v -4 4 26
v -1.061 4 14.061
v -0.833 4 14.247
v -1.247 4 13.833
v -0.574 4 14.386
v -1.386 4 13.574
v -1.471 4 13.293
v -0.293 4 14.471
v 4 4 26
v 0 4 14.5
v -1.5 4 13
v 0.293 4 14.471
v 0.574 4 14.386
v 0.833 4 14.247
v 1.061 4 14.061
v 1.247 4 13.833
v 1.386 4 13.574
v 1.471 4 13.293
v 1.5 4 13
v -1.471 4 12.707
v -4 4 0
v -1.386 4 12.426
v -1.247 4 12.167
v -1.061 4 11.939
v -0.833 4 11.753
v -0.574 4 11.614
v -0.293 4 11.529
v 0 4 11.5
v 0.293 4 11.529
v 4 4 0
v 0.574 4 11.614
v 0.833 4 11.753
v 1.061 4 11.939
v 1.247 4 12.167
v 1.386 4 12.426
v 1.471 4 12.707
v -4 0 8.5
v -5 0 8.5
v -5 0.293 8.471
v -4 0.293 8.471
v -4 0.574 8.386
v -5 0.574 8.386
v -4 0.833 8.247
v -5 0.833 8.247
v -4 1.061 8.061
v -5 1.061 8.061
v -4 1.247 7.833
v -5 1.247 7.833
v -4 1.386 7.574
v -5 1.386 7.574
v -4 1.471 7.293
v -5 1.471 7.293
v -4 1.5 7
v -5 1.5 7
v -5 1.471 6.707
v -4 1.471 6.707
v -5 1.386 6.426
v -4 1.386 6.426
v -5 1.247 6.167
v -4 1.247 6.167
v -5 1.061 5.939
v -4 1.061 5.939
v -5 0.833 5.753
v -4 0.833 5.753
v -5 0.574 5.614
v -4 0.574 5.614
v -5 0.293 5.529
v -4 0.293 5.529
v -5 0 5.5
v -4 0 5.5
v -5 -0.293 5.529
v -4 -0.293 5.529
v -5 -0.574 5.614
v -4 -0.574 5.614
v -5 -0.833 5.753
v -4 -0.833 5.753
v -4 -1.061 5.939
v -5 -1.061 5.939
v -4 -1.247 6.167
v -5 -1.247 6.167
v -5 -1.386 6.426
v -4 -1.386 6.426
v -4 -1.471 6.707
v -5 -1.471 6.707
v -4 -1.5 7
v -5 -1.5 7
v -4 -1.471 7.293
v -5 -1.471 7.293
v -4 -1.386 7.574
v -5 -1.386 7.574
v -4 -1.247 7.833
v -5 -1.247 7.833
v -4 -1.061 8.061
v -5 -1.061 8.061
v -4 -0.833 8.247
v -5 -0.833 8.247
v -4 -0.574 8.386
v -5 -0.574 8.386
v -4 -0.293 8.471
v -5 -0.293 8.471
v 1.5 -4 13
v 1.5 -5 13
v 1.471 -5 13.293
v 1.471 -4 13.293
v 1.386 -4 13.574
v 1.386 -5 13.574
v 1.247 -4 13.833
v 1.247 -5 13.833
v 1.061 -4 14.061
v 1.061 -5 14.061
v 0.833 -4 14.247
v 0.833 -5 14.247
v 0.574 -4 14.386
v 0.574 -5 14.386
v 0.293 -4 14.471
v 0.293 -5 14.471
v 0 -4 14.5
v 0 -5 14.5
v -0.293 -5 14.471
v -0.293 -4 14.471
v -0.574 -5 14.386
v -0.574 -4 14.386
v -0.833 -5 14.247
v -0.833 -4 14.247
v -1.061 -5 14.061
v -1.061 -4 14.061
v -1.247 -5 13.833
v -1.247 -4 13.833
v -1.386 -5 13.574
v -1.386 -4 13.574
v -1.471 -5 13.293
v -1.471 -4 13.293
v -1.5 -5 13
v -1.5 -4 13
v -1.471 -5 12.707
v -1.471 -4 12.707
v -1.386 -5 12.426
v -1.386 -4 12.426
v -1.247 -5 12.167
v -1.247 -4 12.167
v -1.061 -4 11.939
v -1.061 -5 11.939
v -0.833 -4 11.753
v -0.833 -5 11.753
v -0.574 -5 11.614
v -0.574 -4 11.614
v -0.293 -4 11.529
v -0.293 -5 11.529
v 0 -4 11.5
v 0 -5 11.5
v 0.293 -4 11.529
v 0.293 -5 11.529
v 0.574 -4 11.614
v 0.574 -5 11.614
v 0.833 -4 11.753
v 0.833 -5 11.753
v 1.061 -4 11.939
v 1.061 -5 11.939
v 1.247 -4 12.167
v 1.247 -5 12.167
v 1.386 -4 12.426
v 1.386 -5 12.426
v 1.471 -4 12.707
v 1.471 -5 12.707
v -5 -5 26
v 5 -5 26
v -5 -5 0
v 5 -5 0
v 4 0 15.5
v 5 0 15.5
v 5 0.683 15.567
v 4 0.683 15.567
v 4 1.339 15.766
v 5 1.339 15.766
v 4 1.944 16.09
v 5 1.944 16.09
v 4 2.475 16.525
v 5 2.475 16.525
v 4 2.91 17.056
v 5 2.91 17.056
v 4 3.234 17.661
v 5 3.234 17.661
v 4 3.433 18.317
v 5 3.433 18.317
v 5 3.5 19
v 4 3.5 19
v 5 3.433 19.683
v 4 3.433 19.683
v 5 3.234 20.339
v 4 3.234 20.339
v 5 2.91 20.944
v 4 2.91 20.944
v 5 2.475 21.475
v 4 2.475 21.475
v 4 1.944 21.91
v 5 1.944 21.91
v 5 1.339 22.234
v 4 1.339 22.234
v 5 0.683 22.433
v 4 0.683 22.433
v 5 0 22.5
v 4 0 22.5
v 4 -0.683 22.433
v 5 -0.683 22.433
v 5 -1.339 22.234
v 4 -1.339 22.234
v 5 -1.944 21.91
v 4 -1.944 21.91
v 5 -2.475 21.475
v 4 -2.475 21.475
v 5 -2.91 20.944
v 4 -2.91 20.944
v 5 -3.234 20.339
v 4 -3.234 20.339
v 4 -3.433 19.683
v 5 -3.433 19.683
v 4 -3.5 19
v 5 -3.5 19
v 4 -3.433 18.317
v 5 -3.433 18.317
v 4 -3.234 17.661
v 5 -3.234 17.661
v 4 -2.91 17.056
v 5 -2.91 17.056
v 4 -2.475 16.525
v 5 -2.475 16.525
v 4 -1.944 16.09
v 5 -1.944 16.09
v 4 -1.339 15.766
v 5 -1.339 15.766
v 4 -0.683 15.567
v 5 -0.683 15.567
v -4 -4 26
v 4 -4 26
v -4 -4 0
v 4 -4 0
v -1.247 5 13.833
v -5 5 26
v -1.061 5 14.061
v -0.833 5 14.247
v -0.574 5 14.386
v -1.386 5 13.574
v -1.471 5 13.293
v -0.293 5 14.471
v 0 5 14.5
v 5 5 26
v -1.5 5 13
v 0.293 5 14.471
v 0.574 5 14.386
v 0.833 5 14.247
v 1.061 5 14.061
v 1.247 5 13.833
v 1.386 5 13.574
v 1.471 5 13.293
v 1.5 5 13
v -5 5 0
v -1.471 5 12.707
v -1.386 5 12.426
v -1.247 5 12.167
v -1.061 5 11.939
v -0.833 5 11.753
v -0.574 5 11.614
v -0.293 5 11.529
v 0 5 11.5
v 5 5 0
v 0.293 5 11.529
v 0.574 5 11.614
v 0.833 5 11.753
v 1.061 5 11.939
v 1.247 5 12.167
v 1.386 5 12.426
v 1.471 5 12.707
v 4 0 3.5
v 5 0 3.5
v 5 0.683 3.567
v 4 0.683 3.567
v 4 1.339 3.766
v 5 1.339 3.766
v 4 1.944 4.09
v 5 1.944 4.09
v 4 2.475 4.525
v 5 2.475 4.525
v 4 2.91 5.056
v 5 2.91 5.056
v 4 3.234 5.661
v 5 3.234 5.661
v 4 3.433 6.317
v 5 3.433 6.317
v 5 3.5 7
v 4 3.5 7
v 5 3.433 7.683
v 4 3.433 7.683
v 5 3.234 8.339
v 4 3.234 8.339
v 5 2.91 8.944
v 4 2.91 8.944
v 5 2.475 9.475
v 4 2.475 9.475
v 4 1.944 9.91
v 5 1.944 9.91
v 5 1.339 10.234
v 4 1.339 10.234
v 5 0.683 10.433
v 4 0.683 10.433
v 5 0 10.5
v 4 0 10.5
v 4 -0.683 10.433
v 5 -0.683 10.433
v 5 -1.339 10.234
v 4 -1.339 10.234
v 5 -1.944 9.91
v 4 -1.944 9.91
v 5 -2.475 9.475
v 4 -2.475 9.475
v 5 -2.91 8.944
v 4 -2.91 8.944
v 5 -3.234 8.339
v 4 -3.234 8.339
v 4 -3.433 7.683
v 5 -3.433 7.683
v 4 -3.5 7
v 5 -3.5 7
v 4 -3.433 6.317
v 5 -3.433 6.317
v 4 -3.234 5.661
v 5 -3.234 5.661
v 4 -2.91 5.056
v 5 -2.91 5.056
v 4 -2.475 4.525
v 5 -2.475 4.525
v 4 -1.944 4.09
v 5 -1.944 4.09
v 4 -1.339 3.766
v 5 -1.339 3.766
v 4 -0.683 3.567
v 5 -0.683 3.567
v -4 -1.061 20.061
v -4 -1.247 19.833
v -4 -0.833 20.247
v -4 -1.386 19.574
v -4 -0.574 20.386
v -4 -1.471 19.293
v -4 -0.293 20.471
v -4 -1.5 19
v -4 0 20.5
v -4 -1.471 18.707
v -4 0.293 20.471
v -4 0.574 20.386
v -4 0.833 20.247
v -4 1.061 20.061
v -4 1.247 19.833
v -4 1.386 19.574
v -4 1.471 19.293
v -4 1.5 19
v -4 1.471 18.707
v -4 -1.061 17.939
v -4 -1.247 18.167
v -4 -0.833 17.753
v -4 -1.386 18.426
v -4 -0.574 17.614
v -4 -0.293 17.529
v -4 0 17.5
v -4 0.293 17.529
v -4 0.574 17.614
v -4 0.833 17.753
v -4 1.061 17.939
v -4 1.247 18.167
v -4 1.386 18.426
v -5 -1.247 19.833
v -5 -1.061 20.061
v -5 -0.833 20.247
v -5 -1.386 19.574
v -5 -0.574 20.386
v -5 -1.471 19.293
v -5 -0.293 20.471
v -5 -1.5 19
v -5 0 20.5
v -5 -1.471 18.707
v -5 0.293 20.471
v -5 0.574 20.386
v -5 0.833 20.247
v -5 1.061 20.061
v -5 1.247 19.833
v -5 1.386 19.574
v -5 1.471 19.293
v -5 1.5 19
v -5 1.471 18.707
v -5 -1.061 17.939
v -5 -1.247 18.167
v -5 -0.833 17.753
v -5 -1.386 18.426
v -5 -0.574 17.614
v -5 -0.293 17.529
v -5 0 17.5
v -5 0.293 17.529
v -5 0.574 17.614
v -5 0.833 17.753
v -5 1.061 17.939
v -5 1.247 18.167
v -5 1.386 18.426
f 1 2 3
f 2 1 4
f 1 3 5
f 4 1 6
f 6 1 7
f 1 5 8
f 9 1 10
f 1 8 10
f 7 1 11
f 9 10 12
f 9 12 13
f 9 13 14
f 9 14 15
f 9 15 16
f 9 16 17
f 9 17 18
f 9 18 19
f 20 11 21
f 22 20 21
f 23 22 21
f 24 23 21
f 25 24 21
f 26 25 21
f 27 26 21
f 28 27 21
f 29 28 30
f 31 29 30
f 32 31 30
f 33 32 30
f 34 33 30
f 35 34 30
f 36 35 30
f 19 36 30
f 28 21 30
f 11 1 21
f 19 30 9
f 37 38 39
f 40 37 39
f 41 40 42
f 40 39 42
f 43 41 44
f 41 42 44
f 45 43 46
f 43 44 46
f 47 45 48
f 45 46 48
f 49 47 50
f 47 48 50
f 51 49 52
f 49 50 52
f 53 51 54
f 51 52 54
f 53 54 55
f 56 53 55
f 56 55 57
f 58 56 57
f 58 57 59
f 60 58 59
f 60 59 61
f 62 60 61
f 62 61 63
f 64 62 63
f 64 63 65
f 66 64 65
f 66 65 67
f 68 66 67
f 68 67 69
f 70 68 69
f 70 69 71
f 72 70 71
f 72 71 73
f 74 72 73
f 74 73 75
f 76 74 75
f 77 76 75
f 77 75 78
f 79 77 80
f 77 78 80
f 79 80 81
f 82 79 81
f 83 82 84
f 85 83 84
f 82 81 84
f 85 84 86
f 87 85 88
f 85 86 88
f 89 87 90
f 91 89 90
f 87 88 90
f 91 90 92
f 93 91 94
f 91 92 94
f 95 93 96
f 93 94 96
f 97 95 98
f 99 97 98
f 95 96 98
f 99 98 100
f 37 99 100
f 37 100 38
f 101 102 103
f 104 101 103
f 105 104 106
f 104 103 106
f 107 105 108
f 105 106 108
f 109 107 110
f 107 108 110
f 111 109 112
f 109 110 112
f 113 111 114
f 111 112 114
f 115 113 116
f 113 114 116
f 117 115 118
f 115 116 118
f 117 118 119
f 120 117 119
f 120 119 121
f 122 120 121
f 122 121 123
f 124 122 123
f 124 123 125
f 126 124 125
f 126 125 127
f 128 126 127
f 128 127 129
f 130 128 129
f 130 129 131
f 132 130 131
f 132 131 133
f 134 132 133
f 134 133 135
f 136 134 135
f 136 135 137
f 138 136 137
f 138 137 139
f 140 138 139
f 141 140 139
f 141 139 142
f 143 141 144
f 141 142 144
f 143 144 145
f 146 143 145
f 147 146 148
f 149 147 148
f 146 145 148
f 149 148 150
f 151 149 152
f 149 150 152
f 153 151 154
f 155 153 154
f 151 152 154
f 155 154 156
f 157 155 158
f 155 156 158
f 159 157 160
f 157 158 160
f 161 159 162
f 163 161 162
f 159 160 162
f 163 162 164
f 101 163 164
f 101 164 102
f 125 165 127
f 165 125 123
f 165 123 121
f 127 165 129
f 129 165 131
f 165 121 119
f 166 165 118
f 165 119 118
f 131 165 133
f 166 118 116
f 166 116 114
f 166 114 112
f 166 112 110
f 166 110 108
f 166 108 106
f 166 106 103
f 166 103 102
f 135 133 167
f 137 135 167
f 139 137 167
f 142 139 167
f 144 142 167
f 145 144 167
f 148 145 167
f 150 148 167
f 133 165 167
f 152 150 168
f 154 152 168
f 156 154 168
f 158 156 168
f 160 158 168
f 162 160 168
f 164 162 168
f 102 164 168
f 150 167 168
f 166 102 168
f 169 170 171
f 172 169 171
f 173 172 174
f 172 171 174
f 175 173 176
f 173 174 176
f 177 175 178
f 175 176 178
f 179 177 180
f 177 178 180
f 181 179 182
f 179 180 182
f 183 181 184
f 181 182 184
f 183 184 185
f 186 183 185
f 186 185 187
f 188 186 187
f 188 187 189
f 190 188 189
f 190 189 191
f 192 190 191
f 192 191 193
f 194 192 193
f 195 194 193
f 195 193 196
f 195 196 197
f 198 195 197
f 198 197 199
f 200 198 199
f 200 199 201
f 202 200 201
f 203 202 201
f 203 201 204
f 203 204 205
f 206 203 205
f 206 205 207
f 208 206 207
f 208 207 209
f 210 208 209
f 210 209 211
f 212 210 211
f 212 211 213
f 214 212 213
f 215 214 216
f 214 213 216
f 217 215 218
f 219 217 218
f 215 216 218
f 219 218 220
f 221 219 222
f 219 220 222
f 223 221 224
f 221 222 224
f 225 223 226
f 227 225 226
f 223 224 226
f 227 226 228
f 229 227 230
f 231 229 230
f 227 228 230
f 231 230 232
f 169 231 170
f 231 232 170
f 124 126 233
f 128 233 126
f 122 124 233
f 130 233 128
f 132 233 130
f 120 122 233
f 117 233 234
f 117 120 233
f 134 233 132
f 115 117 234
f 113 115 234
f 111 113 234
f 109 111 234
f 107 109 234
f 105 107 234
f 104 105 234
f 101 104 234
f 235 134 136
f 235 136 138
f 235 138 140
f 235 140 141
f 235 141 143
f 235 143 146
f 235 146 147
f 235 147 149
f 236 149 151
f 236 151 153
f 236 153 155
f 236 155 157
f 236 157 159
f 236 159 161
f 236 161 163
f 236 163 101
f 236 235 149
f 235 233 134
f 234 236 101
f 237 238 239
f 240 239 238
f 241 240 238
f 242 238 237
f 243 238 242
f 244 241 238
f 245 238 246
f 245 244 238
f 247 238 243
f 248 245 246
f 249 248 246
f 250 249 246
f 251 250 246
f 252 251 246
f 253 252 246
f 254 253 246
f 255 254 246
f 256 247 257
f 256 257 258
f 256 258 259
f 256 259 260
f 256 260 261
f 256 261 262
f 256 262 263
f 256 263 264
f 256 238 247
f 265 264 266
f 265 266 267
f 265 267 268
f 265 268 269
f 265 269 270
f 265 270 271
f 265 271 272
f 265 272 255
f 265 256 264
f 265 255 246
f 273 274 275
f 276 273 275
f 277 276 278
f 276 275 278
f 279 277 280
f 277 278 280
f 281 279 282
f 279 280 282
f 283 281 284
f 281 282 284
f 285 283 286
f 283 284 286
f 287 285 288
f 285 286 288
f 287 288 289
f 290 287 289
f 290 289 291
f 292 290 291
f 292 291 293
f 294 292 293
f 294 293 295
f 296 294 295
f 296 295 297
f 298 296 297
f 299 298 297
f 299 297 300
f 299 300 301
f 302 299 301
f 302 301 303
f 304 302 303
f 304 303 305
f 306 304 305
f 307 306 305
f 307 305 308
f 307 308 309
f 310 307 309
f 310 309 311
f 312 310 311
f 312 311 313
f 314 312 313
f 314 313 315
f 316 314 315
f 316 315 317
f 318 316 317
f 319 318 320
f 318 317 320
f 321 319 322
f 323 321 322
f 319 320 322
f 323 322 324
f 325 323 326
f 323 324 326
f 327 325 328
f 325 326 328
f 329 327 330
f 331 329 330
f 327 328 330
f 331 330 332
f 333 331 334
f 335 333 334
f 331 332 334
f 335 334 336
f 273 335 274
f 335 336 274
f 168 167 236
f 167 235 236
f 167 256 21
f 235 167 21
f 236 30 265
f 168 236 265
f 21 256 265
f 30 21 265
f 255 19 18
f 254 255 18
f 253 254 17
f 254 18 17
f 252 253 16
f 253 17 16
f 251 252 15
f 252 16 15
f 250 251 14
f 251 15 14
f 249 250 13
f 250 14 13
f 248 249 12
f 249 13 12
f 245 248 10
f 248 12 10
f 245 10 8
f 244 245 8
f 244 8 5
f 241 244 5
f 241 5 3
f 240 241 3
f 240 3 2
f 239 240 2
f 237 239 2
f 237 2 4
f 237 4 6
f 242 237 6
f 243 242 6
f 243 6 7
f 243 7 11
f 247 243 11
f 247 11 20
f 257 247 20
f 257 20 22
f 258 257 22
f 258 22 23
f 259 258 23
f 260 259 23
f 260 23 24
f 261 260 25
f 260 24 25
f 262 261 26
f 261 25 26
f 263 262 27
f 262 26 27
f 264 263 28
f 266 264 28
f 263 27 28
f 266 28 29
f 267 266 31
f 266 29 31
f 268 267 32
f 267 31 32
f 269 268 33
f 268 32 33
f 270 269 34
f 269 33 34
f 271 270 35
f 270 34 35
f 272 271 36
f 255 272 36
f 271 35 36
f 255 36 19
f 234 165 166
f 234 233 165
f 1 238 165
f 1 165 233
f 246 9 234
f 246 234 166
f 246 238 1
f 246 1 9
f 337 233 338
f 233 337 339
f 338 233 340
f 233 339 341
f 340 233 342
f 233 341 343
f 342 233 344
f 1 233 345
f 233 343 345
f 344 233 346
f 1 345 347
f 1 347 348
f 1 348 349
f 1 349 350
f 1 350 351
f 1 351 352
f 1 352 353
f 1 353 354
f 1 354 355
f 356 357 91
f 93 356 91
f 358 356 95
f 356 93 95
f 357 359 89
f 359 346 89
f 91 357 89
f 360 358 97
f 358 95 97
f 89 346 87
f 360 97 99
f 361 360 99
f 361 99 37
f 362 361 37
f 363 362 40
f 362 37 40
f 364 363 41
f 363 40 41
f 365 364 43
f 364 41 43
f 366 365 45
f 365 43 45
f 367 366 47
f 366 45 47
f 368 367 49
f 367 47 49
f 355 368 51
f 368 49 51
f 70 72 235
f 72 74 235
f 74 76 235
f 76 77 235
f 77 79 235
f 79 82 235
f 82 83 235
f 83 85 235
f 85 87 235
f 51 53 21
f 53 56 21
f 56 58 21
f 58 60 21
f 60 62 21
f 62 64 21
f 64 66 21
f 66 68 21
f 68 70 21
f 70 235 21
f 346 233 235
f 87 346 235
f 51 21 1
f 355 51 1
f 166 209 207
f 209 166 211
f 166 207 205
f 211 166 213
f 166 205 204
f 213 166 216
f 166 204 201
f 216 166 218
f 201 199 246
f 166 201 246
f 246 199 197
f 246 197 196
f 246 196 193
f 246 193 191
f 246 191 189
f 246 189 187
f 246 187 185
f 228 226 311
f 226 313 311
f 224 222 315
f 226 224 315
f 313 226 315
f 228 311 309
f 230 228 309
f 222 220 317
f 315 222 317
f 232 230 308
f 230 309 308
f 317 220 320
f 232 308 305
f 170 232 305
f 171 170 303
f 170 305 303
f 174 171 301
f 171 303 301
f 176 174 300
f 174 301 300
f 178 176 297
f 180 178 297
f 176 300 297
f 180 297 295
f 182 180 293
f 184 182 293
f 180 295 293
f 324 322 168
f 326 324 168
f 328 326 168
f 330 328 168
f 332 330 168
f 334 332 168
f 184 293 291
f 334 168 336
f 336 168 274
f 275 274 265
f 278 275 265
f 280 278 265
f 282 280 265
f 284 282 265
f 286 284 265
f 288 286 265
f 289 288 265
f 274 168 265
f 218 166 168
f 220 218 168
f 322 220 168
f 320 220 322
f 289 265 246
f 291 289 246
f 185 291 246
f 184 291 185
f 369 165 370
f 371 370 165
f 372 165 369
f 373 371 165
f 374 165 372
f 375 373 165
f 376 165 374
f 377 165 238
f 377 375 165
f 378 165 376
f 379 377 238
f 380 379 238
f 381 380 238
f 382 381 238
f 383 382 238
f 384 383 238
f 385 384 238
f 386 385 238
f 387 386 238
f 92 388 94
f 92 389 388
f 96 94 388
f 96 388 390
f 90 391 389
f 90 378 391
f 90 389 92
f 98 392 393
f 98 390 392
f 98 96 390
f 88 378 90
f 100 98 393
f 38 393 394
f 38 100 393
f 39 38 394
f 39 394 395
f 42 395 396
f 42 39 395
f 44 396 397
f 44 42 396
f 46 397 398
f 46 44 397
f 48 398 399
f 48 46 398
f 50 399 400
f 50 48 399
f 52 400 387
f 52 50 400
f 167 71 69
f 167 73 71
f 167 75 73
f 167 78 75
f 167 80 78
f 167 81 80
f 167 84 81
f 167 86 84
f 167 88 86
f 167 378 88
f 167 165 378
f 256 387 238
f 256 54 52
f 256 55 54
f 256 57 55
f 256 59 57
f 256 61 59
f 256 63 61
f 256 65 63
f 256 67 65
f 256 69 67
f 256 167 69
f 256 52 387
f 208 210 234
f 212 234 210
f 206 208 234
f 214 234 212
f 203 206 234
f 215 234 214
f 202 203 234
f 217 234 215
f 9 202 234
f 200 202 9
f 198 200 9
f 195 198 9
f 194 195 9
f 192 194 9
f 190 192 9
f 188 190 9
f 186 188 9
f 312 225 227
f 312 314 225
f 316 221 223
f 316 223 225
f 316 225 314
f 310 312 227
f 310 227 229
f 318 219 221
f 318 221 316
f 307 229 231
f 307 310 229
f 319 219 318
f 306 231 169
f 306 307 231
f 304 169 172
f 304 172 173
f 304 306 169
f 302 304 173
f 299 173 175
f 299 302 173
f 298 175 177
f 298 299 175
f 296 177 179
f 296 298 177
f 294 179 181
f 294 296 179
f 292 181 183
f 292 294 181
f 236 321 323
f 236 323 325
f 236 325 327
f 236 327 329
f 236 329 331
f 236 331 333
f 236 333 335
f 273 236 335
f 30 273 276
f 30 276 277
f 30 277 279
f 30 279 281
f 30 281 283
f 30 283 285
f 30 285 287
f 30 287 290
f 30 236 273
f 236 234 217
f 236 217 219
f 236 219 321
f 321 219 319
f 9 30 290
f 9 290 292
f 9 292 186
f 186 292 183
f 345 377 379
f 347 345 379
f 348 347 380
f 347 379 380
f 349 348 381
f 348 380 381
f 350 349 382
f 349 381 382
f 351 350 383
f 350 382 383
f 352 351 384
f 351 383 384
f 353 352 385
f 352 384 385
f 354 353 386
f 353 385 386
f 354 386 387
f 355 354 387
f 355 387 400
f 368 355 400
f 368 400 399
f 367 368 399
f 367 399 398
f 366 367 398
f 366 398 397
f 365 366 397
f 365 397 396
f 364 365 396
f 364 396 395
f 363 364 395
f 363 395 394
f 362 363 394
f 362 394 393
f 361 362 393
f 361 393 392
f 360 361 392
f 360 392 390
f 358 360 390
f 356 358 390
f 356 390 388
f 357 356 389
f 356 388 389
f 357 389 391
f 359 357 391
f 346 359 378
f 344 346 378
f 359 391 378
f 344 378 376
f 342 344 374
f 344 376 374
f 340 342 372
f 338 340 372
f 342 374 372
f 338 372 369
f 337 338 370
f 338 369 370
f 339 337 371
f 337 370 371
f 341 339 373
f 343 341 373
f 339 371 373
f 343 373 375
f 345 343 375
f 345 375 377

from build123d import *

# Parameters (mm, degrees)
SKETCH_1_W          = 10
SKETCH_1_H          = 10
SKETCH_1_W_2        = 8
SKETCH_1_H_2        = 8
EXTRUDE_1_DEPTH     = 26
SKETCH_2_R          = 1.5
CUT_EXTRUDE_1_DEPTH = 10
SKETCH_3_R          = 1.5
CUT_EXTRUDE_2_DEPTH = 10
SKETCH_4_R          = 3.5
CUT_EXTRUDE_3_DEPTH = 5


with BuildPart() as part:
    # 草图1 → 拉伸-薄壁1 (new body)
    with BuildSketch(Plane.XY):
        Rectangle(SKETCH_1_W, SKETCH_1_H)
        Rectangle(SKETCH_1_W_2, SKETCH_1_H_2, mode=Mode.SUBTRACT)
    extrude(amount=EXTRUDE_1_DEPTH)

    # 草图2 → 切除-拉伸1 (cut)
    with BuildSketch(Plane.ZY.offset(5)):
        with Locations((7, 0)):
            Circle(SKETCH_2_R)
        with Locations((19, 0)):
            Circle(SKETCH_2_R)
    extrude(amount=-CUT_EXTRUDE_1_DEPTH, mode=Mode.SUBTRACT)

    # 草图3 → 切除-拉伸2 (cut)
    with BuildSketch(Plane.XZ.offset(5)):
        with Locations((0, 13)):
            Circle(SKETCH_3_R)
    extrude(amount=-CUT_EXTRUDE_2_DEPTH, mode=Mode.SUBTRACT)

    # 草图4 → 切除-拉伸3 (cut)
    with BuildSketch(Plane(origin=(5, 0, 0), x_dir=(0, 0, -1), z_dir=(1, 0, 0))):
        with Locations((-19, 0)):
            Circle(SKETCH_4_R)
        with Locations((-7, 0)):
            Circle(SKETCH_4_R)
    extrude(amount=-CUT_EXTRUDE_3_DEPTH, mode=Mode.SUBTRACT)


solid = part.part
